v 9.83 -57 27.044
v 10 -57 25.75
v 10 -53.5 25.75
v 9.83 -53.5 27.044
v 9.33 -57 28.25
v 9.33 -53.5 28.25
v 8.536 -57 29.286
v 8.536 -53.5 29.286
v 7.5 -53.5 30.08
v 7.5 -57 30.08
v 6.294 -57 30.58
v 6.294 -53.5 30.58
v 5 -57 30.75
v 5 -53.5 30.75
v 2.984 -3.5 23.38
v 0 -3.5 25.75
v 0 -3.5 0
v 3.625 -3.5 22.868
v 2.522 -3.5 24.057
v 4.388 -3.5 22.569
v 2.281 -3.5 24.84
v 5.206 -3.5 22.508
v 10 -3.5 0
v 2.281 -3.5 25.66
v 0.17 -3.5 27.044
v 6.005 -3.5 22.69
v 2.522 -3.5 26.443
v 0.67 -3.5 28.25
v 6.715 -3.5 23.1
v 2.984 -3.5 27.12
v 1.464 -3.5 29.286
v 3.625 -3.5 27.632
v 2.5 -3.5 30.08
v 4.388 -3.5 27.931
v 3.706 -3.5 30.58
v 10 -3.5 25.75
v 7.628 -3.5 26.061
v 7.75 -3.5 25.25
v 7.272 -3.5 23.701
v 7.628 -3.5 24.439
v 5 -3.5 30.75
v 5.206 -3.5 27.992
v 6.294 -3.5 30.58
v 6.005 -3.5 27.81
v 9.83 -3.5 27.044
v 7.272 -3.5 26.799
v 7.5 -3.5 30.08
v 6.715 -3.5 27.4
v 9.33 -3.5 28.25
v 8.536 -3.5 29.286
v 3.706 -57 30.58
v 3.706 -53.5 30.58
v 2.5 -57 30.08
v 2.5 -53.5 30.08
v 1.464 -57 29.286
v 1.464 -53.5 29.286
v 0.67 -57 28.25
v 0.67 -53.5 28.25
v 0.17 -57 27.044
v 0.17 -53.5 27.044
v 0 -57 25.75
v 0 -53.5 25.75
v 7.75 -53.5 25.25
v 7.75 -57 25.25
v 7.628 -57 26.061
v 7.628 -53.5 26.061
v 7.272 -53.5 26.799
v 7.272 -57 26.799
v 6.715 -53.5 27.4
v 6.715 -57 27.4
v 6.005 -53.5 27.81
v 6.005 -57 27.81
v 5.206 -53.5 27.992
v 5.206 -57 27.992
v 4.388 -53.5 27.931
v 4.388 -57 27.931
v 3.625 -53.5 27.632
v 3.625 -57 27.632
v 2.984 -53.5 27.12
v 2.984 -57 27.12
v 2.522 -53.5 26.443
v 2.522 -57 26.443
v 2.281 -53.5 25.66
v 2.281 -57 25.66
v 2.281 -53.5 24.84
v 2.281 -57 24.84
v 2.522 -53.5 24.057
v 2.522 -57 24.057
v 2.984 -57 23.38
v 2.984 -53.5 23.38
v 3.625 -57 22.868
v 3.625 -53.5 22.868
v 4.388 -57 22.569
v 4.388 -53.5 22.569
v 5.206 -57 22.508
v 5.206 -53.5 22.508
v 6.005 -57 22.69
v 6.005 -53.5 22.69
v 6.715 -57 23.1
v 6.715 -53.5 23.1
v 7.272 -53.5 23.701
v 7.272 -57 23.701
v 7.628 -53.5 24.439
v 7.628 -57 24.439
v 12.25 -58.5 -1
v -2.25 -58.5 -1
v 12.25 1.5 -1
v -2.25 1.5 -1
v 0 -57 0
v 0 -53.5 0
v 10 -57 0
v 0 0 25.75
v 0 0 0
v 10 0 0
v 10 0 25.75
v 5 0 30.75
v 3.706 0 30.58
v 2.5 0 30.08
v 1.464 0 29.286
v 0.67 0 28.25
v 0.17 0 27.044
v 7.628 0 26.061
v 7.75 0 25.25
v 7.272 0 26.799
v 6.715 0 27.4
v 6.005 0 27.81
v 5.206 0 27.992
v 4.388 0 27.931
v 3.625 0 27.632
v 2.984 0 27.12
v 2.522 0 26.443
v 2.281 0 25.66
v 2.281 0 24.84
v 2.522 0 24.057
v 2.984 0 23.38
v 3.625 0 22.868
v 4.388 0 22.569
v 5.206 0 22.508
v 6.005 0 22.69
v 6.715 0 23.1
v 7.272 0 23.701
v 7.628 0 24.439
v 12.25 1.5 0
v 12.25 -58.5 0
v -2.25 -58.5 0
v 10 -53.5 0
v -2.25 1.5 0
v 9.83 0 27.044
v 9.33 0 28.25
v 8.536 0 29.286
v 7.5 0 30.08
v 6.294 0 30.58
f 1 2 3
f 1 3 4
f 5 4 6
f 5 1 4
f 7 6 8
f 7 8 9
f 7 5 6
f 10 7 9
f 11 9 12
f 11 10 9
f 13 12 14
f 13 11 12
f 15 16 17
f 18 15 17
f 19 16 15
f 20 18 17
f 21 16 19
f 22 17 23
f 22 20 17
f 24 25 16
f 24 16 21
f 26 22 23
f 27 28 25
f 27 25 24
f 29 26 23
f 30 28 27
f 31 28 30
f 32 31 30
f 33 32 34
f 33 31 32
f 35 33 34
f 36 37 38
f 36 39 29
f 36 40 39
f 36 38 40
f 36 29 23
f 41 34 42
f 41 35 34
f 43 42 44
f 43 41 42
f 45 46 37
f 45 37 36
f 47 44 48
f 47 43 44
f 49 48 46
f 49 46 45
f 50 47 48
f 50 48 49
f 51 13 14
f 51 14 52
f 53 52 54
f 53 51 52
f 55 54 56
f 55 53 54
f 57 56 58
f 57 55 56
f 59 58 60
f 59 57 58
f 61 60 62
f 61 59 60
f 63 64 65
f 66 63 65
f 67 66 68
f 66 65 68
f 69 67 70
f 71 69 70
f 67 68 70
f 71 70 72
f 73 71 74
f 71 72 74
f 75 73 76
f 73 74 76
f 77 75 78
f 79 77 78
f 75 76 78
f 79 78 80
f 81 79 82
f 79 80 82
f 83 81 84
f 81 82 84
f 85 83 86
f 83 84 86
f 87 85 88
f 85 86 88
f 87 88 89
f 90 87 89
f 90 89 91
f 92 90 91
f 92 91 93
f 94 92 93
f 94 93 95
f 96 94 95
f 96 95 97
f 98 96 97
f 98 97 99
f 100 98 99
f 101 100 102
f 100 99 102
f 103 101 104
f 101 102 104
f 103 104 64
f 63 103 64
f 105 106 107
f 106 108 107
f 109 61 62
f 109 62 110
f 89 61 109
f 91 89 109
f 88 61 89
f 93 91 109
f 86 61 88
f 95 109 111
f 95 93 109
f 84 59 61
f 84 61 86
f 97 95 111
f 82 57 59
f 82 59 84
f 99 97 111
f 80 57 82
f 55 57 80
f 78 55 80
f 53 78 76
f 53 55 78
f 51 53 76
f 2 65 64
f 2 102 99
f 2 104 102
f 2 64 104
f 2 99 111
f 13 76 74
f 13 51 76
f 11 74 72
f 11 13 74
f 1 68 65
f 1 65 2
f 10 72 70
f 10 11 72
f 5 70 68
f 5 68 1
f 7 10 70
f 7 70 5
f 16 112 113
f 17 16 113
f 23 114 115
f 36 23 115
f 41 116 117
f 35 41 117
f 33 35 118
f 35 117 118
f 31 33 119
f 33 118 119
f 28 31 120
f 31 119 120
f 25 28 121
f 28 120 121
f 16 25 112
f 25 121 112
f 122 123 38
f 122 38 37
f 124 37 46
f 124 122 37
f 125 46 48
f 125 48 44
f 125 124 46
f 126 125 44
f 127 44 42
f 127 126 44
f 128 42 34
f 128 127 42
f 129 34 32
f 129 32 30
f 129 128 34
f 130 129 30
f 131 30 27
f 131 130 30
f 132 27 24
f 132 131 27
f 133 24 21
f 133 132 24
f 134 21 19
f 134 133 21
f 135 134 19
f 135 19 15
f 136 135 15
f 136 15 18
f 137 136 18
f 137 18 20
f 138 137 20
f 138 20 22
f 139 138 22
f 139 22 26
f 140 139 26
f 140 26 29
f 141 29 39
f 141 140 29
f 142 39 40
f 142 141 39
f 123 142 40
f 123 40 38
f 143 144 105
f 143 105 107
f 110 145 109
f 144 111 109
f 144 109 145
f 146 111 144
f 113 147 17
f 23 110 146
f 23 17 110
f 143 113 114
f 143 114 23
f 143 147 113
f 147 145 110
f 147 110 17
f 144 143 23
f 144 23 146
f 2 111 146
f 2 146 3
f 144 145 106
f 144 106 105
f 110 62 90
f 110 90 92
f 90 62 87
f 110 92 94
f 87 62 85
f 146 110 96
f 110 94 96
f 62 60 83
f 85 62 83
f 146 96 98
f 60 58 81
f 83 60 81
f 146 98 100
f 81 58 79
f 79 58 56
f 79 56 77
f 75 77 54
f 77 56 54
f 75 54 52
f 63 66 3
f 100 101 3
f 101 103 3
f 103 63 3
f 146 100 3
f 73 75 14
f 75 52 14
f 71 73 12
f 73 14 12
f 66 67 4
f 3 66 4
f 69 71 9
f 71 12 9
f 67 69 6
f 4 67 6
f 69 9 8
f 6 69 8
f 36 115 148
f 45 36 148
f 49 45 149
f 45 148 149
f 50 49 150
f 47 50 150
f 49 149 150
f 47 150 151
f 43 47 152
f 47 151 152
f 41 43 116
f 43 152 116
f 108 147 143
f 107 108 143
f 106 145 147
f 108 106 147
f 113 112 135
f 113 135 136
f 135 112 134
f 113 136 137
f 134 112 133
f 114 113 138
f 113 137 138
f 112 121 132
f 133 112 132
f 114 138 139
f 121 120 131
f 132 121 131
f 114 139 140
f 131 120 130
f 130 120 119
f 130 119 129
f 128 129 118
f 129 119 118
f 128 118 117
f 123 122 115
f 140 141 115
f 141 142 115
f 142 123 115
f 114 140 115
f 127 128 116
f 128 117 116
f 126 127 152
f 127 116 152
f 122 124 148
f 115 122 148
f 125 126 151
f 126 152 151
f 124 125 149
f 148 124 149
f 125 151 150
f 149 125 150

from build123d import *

# Parameters (mm, degrees)
F0_R     = 2.75
F1_DEPTH = 3.5
F2_W     = 14.5
F2_H     = 30
F2_W_2   = 10
F2_H_2   = 3.5
F3_DEPTH = 1


with BuildPart() as f1:
    # F0 (on Front) → F1 (new body)
    with BuildSketch(Plane.XZ):
        with BuildLine():
            Line((0, 25.75), (0, 0))
            Line((0, 0), (10, 0))
            Line((10, 0), (10, 25.75))
            ThreePointArc((10, 25.75), (8.535534, 29.285534), (5, 30.75))
            ThreePointArc((5, 30.75), (1.464466, 29.285534), (0, 25.75))
        make_face()
        with Locations((5, 25.25)):
            Circle(F0_R, mode=Mode.SUBTRACT)
    extrude(amount=F1_DEPTH)

    # F2 (on face) → F3 (join)
    with BuildSketch(Plane(origin=(0, 0, 0), x_dir=(1, 0, 0), z_dir=(0, 0, -1))):
        with Locations((5, 13.5)):
            Rectangle(F2_W, F2_H)
        with Locations((5, 1.75)):
            Rectangle(F2_W_2, F2_H_2, mode=Mode.SUBTRACT)
        with Locations((5, 1.75)):
            Rectangle(F2_W_2, F2_H_2)
    extrude(amount=F3_DEPTH)

    # F4: F1 across face


with BuildPart() as f1_1:
    add(f1.part)
    add(f1.part.mirror(Plane(origin=(5, -28.5, -0.5), x_dir=(1, 0, 0), z_dir=(0, -1, 0))))


solid = f1_1.part
